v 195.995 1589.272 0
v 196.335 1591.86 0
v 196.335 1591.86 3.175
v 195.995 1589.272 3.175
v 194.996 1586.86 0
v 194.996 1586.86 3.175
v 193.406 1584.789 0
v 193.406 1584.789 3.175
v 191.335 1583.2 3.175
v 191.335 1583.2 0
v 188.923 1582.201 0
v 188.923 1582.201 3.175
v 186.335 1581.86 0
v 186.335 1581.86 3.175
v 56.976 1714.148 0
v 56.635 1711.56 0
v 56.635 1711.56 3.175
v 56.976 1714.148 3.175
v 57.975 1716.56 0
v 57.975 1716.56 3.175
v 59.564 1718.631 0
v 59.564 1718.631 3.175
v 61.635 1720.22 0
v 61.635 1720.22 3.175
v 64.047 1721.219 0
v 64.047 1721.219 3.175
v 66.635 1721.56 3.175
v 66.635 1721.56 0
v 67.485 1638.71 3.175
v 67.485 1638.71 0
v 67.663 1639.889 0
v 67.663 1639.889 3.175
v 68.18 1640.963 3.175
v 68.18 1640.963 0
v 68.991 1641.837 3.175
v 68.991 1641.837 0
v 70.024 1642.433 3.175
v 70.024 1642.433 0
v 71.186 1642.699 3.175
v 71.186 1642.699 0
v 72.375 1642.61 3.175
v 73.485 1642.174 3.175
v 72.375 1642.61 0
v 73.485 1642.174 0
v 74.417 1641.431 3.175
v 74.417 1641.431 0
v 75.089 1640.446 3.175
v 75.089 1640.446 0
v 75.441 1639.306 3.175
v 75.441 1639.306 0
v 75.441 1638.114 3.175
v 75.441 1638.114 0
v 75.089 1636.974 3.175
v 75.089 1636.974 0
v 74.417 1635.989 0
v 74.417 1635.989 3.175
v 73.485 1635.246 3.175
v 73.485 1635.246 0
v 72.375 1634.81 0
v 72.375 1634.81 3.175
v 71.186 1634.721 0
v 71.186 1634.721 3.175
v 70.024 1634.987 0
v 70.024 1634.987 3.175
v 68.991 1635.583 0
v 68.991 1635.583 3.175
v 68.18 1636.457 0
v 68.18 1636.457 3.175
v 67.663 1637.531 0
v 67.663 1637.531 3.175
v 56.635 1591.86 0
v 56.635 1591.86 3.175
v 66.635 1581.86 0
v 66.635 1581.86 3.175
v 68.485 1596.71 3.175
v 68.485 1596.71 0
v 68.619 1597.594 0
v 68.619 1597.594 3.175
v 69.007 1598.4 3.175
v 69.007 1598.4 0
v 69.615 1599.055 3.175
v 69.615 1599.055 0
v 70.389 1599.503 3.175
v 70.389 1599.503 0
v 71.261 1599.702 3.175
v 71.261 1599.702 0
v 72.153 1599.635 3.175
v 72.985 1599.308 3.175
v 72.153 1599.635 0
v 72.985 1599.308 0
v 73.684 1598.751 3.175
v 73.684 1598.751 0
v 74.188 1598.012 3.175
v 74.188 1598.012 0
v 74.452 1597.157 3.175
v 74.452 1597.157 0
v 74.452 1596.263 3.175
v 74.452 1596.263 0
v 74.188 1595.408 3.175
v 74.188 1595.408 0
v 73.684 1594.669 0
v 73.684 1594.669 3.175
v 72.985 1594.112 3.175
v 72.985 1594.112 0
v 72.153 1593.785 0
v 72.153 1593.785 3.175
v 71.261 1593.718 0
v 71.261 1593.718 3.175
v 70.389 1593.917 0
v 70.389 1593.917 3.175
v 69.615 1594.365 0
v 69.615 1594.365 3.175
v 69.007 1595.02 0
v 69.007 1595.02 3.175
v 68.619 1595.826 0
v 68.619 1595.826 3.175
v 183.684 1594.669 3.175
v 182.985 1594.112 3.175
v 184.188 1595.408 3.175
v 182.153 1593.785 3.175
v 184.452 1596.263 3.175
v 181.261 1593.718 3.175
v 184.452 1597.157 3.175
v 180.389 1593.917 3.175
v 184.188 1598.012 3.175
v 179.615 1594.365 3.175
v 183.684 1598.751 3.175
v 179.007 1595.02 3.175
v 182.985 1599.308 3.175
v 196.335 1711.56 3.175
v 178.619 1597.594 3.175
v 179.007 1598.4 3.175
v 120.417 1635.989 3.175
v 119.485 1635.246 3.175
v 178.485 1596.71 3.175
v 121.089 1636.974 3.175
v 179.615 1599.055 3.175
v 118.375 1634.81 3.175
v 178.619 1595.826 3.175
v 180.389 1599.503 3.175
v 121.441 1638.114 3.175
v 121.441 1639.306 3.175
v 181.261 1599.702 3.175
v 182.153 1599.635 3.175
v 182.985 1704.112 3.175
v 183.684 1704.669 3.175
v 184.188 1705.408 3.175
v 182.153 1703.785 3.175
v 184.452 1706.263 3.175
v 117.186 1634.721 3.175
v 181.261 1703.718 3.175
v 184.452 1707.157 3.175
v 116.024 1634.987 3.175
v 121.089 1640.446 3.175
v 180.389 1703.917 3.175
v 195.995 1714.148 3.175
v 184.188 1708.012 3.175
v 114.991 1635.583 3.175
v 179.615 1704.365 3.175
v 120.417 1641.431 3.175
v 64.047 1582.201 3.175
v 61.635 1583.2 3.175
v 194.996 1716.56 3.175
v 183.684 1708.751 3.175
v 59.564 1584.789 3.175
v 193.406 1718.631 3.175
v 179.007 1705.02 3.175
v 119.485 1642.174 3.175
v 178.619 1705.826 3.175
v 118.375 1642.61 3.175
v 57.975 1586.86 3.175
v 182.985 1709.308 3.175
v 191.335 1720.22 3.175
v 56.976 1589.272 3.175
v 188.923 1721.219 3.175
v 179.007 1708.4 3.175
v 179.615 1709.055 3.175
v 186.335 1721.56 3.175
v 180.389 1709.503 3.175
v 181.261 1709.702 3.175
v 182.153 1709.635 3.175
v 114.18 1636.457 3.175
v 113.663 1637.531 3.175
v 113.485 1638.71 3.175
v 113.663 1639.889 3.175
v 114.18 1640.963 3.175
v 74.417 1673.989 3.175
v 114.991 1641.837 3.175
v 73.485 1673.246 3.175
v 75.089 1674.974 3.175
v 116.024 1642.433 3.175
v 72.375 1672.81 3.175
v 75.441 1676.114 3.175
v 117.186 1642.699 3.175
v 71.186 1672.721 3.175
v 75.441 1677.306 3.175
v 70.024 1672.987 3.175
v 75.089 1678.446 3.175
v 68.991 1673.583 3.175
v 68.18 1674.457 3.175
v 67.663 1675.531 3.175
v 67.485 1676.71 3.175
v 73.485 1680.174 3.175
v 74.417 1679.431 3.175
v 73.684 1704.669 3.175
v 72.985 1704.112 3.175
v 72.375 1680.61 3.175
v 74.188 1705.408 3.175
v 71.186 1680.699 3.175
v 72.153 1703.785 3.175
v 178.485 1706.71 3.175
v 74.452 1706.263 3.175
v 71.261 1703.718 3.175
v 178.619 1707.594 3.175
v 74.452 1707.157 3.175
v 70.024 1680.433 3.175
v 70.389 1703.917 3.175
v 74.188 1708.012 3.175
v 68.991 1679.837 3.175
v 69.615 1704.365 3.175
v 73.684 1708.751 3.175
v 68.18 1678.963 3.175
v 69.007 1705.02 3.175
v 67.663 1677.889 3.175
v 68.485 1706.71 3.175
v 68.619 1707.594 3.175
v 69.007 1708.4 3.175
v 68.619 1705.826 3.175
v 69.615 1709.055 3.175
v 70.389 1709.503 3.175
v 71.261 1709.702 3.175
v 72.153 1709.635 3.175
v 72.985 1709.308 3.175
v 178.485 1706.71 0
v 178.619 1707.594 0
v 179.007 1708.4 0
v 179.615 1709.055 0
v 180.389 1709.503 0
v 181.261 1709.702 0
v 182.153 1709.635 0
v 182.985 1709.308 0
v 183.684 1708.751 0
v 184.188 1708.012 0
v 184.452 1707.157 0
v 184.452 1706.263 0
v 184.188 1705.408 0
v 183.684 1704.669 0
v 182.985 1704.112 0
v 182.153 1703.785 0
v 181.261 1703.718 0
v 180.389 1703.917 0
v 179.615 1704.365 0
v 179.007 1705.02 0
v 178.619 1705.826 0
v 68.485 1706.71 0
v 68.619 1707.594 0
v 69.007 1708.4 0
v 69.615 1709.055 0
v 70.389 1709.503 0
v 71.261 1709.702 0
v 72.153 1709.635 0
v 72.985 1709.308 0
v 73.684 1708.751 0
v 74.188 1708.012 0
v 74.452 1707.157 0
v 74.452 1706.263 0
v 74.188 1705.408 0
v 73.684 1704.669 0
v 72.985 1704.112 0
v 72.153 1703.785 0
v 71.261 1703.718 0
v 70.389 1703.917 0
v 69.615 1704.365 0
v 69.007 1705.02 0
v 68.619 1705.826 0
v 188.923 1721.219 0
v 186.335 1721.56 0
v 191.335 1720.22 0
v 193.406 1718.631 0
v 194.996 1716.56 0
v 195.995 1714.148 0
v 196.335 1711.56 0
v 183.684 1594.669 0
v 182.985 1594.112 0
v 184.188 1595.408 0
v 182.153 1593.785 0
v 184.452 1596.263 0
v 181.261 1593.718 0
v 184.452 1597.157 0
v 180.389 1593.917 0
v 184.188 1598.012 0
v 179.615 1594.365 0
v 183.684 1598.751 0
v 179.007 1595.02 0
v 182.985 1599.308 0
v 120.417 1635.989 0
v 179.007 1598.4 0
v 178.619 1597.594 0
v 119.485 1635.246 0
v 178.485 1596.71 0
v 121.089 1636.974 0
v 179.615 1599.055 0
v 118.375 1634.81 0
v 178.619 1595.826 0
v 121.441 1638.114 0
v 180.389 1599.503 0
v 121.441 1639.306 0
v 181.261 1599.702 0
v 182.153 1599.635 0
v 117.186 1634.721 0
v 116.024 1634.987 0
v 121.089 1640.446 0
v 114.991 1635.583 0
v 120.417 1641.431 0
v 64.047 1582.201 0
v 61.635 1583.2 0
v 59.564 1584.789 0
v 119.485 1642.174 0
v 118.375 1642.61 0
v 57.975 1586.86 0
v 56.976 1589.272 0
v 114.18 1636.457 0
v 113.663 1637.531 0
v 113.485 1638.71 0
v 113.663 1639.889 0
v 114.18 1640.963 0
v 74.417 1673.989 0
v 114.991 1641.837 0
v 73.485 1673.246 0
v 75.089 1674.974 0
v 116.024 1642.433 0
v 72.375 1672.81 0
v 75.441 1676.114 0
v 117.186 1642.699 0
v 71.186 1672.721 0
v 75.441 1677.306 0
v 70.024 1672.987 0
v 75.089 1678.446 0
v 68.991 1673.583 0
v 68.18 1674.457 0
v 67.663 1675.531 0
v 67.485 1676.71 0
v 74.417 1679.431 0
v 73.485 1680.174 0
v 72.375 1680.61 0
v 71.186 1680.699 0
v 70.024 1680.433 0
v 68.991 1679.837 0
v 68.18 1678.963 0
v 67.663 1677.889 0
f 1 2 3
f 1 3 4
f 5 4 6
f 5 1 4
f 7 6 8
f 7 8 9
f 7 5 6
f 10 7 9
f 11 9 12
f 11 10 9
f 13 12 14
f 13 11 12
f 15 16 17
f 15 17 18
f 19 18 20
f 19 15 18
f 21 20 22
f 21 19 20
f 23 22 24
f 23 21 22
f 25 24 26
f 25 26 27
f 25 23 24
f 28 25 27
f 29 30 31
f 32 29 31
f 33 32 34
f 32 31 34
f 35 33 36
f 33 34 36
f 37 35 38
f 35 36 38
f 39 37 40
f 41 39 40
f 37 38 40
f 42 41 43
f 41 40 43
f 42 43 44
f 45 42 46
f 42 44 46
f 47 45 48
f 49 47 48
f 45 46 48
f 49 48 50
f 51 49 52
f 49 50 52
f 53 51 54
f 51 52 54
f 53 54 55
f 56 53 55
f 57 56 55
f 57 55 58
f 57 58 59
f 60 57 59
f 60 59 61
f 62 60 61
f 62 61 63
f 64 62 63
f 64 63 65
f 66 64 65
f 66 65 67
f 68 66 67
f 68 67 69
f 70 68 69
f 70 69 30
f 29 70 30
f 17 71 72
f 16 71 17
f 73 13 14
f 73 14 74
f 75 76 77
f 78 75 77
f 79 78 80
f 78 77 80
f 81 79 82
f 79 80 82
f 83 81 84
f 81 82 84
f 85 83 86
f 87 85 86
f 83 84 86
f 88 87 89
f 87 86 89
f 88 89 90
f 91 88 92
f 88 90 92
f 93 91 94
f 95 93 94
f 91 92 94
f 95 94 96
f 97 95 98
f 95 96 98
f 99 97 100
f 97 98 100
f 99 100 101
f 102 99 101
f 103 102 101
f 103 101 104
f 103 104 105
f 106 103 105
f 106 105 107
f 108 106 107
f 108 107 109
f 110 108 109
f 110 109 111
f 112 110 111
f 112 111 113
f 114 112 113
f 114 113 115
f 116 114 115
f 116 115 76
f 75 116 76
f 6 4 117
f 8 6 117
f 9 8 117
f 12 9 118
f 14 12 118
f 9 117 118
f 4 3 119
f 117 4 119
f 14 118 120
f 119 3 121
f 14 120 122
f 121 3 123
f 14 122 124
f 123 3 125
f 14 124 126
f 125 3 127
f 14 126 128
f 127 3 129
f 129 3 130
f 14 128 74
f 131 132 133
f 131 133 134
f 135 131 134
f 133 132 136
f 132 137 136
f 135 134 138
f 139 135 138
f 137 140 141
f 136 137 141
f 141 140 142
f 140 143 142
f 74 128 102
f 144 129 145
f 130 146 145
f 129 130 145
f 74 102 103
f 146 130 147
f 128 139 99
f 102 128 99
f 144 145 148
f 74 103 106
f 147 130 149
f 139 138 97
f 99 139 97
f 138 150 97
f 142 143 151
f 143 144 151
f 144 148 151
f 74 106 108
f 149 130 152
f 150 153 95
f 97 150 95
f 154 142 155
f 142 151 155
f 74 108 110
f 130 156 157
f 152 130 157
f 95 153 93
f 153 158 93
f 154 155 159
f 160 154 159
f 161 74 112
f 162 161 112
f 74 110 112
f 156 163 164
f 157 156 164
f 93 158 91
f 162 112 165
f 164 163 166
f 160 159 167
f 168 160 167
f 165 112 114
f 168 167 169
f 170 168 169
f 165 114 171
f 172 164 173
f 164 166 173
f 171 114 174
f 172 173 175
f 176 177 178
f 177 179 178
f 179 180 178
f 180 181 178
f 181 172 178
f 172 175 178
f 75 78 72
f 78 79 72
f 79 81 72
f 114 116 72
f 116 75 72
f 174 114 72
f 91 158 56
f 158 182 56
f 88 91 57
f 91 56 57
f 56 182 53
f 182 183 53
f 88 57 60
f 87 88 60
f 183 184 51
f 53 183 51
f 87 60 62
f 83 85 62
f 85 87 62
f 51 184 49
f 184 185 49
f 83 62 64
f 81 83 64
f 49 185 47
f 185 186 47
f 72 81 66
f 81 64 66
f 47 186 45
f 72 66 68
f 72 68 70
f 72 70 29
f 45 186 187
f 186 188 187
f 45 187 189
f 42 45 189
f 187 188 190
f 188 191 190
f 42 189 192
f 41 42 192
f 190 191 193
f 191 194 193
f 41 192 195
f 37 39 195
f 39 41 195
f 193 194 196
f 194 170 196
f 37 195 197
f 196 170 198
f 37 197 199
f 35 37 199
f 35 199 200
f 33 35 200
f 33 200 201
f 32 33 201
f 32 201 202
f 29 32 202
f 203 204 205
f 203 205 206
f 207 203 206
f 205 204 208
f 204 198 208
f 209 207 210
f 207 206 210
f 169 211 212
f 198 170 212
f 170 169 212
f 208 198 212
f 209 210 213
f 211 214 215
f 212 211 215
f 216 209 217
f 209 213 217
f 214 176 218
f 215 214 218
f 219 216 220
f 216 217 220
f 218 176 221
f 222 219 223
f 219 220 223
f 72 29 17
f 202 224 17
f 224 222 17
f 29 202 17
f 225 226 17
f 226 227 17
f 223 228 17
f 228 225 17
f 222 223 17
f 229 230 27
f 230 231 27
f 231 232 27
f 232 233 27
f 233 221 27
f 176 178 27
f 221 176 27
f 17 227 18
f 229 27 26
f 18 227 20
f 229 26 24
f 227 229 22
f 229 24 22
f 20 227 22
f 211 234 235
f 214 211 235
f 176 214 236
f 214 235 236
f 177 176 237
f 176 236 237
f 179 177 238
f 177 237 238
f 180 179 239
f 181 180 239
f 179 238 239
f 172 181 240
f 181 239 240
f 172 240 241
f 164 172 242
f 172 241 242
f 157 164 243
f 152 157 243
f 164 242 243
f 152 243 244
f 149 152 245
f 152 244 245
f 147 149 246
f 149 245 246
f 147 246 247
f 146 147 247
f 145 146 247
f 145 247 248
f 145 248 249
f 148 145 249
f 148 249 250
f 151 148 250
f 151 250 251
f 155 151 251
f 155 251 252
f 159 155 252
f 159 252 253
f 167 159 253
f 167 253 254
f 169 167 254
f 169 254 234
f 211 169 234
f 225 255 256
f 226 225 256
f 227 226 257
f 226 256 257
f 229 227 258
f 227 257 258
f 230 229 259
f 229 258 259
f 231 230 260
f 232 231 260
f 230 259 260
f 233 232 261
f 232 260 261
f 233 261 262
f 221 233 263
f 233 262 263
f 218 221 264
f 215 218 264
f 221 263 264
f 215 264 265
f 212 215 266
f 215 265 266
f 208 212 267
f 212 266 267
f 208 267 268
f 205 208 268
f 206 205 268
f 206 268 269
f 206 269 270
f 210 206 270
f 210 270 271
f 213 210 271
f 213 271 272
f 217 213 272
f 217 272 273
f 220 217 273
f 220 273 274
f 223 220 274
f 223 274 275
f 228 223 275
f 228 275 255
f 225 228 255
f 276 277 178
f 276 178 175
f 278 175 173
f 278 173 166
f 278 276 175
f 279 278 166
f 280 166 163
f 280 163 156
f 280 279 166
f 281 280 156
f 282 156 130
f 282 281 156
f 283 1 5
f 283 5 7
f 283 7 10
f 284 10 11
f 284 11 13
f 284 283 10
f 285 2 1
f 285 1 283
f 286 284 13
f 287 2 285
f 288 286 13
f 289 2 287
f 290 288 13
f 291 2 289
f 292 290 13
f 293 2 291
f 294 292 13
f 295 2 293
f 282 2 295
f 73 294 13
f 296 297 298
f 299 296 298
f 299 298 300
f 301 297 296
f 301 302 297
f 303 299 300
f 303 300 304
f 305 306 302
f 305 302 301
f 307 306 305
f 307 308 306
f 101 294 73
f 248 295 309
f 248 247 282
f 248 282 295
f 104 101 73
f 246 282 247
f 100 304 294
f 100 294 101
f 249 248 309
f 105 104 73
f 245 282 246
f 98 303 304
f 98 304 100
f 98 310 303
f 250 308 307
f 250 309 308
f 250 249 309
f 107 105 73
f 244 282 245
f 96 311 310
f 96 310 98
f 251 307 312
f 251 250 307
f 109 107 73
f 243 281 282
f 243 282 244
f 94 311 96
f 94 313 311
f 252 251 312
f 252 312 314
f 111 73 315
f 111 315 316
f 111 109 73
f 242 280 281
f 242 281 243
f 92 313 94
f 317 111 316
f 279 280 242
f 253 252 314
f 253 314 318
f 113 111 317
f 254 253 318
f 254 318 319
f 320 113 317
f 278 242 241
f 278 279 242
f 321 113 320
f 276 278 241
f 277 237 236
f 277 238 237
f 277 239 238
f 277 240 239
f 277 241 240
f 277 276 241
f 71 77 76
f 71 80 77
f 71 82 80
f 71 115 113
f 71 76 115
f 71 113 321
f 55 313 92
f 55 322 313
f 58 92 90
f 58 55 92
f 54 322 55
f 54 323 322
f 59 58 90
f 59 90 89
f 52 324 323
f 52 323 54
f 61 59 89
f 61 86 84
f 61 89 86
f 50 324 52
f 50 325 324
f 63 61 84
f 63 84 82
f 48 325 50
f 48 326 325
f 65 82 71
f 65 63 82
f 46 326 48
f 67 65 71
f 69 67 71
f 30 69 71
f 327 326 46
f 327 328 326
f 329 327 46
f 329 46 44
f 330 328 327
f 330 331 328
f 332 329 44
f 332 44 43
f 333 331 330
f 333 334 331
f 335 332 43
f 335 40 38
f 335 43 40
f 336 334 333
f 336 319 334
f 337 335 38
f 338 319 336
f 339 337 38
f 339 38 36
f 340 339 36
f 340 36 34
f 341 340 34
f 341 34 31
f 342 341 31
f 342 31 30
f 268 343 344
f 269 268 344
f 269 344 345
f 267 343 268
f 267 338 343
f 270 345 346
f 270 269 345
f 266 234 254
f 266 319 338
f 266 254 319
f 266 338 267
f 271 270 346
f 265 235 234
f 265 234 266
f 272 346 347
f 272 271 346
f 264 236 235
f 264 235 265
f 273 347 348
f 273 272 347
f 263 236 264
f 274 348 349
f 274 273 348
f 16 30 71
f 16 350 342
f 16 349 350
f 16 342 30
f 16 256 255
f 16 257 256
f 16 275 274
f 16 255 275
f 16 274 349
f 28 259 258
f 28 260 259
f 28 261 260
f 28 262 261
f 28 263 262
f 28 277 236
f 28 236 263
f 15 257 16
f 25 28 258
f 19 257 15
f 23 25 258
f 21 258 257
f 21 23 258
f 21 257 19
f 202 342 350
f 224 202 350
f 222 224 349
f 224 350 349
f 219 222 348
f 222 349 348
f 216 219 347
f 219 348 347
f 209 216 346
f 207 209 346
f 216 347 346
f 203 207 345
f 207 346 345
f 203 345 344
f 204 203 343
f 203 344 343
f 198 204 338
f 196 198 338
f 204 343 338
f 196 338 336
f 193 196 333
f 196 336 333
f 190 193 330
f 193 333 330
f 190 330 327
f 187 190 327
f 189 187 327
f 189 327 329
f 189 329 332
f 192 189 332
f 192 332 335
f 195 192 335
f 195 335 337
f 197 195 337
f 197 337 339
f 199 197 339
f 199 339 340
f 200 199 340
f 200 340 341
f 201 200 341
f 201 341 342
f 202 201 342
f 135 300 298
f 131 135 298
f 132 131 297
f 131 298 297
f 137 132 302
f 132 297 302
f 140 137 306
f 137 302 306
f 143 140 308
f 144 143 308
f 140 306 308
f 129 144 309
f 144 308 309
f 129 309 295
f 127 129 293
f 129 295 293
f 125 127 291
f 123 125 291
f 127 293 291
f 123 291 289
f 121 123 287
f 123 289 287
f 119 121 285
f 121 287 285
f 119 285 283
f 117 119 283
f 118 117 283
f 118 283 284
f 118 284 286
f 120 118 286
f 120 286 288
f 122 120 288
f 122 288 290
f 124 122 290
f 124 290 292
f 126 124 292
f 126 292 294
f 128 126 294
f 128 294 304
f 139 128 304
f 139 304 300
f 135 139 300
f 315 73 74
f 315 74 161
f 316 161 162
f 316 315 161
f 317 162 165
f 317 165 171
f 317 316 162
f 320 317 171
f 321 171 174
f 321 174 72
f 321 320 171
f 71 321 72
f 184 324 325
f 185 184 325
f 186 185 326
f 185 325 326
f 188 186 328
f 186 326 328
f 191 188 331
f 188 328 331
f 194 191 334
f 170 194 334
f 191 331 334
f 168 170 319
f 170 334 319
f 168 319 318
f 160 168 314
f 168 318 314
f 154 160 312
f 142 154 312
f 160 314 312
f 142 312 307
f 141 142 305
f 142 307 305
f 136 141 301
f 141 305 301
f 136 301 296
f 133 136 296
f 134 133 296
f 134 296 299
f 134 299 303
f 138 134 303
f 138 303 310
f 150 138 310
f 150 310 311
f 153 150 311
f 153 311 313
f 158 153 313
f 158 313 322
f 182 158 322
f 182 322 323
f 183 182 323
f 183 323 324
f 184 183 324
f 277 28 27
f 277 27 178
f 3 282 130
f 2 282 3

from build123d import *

# Parameters (mm, degrees)
BOSS_EXTRUDE1_DEPTH = 3.175
SKETCH2_R           = 4
SKETCH2_R_2         = 3
CUT_EXTRUDE1_DEPTH  = 1733.72226626


with BuildPart() as part:
    # Sketch1 → Boss-Extrude1 (new body)
    with BuildSketch(Plane.XY):
        with BuildLine():
            Line((66.635268781, 1721.56), (186.335268781, 1721.56))
            ThreePointArc((186.335268781, 1721.56), (193.406336593, 1718.631067812), (196.335268781, 1711.56))
            Line((196.335268781, 1711.56), (196.335268781, 1591.86))
            ThreePointArc((196.335268781, 1591.86), (193.406336593, 1584.788932188), (186.335268781, 1581.86))
            Line((186.335268781, 1581.86), (66.635268781, 1581.86))
            ThreePointArc((66.635268781, 1581.86), (59.564200969, 1584.788932188), (56.635268781, 1591.86))
            Line((56.635268781, 1591.86), (56.635268781, 1711.56))
            ThreePointArc((56.635268781, 1711.56), (59.564200969, 1718.631067812), (66.635268781, 1721.56))
        make_face()
    extrude(amount=BOSS_EXTRUDE1_DEPTH)

    # Sketch2 → Cut-Extrude1 (cut, through all)
    with BuildSketch(Plane(origin=(0, 0, 0), x_dir=(-1, 0, 0), z_dir=(0, 0, -1))):
        with Locations((-71.485268781, 1638.71)):
            Circle(SKETCH2_R)
        with Locations((-71.485268781, 1676.71)):
            Circle(SKETCH2_R)
        with Locations((-117.485268781, 1638.71)):
            Circle(SKETCH2_R)
        with Locations((-181.485268781, 1706.71)):
            Circle(SKETCH2_R_2)
        with Locations((-71.485268781, 1706.71)):
            Circle(SKETCH2_R_2)
        with Locations((-181.485268781, 1596.71)):
            Circle(SKETCH2_R_2)
        with Locations((-71.485268781, 1596.71)):
            Circle(SKETCH2_R_2)
    extrude(amount=-CUT_EXTRUDE1_DEPTH, mode=Mode.SUBTRACT)


solid = part.part
